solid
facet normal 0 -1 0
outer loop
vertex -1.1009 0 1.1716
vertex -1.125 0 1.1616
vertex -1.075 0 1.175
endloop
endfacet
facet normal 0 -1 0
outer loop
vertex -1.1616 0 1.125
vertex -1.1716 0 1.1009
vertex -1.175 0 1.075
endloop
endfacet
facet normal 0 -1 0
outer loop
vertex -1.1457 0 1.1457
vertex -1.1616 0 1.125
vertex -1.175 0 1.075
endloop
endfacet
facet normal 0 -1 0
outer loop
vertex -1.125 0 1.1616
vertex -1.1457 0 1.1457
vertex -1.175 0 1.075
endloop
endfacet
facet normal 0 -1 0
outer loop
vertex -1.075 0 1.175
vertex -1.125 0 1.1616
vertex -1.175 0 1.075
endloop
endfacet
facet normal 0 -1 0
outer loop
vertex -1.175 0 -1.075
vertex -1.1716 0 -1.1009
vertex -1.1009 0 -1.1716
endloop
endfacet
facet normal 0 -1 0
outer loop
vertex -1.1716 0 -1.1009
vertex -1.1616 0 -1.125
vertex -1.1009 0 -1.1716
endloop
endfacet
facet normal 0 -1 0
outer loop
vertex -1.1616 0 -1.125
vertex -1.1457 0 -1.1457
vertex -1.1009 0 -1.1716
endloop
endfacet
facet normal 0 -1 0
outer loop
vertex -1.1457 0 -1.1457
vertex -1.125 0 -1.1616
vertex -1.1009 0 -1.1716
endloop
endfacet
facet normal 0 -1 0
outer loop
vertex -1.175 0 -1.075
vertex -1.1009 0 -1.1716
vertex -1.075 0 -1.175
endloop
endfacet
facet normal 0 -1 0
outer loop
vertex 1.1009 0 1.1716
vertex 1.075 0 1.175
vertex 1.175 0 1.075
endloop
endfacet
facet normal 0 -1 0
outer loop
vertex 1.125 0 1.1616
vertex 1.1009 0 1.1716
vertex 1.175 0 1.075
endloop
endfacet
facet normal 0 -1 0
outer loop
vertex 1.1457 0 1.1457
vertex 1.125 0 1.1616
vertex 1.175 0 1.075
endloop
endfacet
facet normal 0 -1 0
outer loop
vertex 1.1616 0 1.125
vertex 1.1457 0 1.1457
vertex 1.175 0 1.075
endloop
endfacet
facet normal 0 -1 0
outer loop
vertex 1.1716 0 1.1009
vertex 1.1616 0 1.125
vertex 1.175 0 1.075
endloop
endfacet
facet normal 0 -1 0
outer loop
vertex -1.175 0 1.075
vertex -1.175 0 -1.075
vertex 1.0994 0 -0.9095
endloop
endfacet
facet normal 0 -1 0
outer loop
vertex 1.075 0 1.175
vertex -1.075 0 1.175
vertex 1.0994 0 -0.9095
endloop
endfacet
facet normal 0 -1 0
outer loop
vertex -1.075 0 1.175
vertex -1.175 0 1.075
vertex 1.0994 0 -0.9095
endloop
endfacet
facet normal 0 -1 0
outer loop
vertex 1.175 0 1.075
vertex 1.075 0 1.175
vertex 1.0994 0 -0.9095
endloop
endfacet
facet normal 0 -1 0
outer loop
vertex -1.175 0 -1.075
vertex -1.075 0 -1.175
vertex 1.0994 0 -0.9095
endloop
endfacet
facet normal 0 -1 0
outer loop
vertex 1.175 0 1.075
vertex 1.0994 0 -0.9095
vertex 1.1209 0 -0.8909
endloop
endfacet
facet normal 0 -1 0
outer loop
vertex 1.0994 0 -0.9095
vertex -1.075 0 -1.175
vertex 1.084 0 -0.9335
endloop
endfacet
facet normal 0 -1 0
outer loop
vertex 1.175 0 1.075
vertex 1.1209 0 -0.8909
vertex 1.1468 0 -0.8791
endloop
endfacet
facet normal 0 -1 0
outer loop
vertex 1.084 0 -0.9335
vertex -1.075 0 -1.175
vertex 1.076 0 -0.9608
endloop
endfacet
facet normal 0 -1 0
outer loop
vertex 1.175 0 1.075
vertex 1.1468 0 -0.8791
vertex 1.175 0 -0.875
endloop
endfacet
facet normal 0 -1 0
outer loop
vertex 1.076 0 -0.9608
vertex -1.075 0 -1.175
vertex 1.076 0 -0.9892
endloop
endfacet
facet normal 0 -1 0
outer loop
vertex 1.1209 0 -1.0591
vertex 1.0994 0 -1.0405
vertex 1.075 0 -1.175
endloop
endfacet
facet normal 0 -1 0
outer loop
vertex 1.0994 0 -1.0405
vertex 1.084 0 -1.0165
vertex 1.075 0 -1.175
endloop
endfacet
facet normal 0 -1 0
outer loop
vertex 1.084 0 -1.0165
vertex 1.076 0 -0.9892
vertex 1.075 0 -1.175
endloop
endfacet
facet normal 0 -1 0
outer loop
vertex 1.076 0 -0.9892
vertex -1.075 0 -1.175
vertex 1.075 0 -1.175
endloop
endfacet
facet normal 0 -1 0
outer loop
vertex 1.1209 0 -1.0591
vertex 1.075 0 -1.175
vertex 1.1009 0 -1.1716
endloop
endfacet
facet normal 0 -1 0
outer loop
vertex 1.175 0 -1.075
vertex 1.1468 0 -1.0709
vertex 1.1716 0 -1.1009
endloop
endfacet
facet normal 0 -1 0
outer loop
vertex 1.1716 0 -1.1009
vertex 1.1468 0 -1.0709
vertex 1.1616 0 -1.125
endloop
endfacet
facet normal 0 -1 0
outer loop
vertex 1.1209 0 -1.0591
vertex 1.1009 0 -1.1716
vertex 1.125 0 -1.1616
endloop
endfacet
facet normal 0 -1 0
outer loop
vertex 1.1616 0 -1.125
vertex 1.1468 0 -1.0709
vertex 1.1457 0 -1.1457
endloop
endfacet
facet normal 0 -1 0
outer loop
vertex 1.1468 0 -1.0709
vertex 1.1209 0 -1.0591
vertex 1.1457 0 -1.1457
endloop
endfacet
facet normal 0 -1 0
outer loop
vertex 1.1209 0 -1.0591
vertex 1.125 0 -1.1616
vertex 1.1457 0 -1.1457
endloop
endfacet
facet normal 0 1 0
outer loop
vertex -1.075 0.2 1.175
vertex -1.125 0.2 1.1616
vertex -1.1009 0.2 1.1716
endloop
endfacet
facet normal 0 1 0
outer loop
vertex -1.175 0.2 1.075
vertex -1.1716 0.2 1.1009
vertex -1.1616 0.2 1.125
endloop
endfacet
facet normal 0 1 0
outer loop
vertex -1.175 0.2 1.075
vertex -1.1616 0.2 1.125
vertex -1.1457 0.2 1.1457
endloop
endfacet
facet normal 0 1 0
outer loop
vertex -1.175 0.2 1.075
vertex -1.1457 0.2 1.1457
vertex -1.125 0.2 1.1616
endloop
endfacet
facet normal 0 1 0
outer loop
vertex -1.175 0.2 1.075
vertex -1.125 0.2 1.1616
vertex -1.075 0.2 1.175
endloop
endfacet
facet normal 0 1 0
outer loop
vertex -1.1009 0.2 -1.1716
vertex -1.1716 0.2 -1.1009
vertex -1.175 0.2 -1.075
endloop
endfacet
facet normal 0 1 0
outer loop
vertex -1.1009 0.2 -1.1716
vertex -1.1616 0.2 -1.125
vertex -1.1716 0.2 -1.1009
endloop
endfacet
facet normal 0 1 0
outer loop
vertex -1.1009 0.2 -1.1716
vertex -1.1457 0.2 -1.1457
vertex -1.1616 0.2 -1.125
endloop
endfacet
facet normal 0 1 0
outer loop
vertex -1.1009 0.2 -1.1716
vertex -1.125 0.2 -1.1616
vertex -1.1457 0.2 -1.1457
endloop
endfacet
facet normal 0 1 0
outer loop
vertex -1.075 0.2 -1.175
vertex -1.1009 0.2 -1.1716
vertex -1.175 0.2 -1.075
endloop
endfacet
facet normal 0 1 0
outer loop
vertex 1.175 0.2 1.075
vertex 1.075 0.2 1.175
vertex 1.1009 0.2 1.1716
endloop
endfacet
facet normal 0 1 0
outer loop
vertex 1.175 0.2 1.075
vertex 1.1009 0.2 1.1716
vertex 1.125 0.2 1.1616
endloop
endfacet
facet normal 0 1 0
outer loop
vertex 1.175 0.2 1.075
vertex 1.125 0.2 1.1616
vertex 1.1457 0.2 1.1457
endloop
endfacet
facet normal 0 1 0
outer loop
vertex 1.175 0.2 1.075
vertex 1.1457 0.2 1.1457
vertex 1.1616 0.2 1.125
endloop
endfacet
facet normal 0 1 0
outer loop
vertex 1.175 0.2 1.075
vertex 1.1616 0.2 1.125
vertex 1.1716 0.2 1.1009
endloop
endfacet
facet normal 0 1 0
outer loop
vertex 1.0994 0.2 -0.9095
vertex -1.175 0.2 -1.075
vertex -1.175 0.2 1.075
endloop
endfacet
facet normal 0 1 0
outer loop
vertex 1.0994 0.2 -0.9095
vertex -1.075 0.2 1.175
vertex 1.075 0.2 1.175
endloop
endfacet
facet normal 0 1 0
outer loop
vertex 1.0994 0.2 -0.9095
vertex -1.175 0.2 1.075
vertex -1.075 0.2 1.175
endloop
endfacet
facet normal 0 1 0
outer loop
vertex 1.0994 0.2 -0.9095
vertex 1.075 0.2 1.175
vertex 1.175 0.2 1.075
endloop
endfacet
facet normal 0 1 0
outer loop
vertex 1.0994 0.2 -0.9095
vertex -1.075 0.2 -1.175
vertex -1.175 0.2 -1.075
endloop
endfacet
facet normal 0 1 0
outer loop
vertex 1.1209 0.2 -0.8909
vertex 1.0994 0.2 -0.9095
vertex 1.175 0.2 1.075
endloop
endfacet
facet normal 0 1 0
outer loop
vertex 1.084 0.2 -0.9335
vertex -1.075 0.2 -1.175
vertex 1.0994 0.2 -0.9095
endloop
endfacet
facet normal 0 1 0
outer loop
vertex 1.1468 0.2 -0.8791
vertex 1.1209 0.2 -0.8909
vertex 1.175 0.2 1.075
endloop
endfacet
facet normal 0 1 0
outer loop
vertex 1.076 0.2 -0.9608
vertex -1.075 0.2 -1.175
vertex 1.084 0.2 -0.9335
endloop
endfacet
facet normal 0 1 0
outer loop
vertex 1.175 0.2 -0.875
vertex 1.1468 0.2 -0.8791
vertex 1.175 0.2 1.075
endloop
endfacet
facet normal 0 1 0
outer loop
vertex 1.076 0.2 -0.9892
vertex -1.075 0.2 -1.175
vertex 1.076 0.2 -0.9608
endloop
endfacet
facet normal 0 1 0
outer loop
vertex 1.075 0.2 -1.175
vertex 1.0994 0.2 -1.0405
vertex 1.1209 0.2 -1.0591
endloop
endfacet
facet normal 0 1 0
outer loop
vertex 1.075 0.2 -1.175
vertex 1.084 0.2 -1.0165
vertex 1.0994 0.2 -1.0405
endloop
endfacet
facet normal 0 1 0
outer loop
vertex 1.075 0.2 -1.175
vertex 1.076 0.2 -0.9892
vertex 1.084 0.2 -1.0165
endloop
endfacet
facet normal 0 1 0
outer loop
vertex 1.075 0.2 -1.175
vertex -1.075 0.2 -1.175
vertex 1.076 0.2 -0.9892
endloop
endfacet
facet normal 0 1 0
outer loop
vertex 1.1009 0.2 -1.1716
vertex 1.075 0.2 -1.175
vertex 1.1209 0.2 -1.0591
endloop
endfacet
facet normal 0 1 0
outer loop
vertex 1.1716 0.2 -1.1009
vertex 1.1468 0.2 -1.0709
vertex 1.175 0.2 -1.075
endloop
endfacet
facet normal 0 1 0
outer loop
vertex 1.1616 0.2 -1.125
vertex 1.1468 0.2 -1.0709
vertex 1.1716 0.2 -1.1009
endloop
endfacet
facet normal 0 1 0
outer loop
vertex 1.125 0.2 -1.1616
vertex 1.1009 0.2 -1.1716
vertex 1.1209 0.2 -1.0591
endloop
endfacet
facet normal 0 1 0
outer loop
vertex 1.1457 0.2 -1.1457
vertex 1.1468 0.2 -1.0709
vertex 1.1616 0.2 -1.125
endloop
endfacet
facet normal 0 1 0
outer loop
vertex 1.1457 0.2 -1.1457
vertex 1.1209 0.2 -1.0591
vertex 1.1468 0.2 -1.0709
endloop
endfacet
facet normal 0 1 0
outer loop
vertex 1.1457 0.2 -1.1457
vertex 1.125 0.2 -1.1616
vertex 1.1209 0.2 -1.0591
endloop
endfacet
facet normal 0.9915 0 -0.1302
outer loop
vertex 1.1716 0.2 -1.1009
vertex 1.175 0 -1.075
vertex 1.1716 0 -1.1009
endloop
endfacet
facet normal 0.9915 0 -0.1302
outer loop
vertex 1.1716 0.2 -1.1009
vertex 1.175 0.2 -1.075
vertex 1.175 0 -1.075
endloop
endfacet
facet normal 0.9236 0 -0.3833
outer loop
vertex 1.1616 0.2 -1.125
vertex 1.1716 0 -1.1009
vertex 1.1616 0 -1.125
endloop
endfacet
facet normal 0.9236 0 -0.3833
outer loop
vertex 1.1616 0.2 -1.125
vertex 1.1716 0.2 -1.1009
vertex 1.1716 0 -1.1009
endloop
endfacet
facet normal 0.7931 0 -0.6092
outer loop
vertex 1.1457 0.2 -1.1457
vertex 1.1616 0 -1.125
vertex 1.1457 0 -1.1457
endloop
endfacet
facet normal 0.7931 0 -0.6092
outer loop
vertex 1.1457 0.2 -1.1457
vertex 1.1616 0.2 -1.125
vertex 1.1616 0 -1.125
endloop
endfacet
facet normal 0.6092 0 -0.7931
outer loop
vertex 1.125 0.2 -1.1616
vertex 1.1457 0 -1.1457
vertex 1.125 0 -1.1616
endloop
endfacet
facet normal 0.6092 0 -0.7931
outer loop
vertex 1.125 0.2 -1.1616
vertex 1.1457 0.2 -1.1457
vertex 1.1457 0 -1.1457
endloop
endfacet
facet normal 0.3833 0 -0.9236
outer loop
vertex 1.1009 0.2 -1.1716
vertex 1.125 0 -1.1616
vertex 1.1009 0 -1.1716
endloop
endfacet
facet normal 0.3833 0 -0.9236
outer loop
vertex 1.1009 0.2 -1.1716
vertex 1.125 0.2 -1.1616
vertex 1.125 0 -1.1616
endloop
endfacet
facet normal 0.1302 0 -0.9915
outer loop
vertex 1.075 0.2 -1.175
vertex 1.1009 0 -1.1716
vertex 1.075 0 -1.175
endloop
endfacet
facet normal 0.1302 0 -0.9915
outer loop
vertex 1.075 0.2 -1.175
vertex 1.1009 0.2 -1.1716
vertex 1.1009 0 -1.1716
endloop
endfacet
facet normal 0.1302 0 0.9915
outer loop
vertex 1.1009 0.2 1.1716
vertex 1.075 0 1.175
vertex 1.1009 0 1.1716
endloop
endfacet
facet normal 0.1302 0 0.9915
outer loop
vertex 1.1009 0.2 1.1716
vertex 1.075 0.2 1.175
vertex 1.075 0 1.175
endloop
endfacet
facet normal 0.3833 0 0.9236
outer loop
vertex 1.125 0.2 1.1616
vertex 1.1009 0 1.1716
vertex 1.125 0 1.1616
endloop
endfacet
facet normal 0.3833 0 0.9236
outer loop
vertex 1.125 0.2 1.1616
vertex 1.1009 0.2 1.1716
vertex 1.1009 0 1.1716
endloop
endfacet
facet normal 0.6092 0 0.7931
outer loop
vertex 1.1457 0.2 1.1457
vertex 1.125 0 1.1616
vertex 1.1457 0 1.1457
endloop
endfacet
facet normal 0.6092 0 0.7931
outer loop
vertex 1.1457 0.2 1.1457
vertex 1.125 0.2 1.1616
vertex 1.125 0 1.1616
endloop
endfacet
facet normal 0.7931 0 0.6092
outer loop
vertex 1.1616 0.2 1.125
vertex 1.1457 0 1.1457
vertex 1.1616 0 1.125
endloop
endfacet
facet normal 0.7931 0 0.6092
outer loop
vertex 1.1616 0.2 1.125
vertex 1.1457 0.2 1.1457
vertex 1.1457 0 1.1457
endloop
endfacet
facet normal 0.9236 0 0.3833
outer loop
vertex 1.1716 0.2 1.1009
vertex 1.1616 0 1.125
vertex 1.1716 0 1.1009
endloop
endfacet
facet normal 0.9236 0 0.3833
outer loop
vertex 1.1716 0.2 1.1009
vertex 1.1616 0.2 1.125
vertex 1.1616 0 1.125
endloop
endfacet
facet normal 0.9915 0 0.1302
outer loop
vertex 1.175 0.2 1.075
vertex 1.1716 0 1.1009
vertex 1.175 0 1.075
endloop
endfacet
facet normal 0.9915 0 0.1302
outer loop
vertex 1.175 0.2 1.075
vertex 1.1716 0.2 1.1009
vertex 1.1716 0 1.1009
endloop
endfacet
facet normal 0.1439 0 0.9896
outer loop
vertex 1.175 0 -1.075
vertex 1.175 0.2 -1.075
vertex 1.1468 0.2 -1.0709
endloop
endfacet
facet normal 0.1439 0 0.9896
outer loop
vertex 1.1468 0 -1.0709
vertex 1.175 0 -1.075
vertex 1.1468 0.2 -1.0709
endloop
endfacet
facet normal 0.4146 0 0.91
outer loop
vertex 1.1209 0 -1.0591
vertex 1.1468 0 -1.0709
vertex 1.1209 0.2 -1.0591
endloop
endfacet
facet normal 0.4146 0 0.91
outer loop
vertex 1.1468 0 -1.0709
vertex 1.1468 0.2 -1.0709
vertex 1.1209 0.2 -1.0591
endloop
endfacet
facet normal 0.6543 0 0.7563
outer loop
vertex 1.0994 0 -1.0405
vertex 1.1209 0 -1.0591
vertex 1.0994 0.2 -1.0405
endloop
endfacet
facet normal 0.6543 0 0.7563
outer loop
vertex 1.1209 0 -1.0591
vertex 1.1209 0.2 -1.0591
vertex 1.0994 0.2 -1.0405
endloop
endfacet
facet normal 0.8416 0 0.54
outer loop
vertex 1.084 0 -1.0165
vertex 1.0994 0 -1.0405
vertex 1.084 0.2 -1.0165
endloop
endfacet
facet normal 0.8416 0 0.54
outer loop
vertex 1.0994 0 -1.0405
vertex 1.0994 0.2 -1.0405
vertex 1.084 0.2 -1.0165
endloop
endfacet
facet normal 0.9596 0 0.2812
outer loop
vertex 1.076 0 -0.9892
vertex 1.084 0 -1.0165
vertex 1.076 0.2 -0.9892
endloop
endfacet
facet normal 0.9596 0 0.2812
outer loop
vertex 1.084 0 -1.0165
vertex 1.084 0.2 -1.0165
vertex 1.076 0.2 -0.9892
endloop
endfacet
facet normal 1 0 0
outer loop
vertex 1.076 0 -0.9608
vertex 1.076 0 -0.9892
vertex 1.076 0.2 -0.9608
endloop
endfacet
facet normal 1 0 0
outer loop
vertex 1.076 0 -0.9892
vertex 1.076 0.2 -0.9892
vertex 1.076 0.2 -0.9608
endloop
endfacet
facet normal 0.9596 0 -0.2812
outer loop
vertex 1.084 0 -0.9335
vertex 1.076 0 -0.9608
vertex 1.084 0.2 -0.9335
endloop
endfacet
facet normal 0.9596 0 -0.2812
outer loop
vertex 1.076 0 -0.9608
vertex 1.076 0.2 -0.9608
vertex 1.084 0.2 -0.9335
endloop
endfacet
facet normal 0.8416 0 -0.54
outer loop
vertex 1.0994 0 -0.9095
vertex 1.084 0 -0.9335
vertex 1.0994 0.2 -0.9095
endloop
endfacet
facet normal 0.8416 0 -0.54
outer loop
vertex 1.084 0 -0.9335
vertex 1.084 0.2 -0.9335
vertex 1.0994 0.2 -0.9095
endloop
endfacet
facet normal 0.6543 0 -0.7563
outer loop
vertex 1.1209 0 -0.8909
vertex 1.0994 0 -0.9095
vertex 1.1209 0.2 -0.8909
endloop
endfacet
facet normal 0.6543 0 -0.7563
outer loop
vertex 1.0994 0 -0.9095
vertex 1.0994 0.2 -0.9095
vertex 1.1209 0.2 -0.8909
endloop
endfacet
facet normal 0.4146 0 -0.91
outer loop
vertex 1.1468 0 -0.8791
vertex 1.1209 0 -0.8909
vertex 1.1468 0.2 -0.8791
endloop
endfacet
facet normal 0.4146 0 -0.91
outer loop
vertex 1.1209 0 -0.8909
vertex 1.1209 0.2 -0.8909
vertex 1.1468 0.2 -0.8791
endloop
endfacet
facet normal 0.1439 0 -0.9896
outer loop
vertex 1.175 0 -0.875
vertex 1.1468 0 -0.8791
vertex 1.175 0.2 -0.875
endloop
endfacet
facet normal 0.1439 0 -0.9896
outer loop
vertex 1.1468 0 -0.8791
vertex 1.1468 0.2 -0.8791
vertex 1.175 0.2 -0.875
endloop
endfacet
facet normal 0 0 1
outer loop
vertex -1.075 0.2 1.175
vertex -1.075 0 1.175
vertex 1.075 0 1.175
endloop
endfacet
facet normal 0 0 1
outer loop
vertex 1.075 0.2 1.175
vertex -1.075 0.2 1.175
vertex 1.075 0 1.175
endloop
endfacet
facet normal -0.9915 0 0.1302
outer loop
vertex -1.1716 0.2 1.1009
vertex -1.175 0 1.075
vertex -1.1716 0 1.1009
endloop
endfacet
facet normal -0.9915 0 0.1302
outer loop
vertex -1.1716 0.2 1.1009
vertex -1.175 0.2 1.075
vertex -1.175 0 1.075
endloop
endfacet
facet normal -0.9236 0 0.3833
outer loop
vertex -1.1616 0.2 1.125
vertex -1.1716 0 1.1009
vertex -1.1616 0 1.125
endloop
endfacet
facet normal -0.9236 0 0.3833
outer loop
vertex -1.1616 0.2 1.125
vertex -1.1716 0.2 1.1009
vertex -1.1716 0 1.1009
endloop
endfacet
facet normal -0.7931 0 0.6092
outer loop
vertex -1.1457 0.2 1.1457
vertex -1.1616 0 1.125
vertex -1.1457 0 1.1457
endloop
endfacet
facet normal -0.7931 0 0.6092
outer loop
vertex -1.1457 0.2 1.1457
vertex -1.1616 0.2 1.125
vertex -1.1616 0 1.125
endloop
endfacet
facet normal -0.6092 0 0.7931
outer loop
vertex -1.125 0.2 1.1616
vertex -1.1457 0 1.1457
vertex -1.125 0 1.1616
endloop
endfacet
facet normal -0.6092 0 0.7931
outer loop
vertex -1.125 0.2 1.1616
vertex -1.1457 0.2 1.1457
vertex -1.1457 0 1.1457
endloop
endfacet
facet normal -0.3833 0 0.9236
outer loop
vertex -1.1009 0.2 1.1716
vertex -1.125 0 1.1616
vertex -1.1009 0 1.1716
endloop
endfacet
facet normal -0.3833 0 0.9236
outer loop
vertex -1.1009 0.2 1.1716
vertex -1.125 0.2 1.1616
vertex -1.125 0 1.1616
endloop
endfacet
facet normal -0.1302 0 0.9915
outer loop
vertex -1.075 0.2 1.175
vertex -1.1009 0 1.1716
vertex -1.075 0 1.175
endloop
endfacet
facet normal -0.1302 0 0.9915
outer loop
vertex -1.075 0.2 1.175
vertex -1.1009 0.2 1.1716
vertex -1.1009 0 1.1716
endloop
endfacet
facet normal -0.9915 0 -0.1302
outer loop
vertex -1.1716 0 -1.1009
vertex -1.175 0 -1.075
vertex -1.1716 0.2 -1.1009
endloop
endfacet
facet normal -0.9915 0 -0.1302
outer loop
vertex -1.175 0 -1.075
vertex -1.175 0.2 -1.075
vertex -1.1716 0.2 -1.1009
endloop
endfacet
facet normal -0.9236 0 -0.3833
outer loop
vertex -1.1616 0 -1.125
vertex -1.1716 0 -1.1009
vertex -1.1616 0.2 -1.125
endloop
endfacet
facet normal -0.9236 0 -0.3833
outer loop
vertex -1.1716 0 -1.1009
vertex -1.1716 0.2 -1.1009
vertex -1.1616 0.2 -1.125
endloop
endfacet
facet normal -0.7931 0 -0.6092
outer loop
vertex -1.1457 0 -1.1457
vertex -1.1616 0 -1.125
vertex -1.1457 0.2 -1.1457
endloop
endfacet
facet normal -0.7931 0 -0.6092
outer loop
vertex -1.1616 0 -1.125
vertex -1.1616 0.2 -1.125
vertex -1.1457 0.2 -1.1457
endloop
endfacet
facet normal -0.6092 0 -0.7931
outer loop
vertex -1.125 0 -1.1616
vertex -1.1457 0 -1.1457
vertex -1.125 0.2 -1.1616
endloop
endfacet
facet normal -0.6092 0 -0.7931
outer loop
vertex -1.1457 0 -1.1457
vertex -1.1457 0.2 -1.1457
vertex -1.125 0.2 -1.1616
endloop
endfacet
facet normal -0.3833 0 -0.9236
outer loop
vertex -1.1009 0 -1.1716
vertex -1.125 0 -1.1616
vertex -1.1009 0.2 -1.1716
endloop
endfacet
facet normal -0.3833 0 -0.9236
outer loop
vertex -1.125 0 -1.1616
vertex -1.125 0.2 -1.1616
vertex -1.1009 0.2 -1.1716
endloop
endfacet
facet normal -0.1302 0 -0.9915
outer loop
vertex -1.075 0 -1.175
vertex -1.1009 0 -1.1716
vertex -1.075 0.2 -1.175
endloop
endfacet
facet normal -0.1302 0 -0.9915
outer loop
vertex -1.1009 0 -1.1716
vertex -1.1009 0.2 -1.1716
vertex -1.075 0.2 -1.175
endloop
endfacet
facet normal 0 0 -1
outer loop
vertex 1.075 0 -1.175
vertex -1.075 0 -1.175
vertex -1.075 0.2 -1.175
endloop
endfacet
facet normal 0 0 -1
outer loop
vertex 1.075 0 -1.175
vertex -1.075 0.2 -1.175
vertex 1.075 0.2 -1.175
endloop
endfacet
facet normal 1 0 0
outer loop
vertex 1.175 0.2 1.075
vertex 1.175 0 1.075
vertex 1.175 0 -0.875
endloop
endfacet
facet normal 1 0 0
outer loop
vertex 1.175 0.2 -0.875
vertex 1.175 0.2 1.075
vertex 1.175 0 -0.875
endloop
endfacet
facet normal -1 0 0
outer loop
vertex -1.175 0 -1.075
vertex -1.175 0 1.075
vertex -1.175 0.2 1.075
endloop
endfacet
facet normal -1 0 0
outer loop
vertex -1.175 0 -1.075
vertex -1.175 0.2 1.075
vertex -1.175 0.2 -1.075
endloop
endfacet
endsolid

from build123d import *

# Parameters (mm, degrees)
SKETCH1_W           = 2.35
SKETCH1_H           = 2.35
BOSS_EXTRUDE1_DEPTH = 0.2
FILLET1_R           = 0.1
SKETCH2_R           = 0.1
CUT_EXTRUDE1_DEPTH  = 1.2


with BuildPart() as part:
    # Sketch1 → Boss-Extrude1 (new body)
    with BuildSketch(Plane(origin=(0, 0, 0), x_dir=(1, 0, 0), z_dir=(0, 1, 0))):
        Rectangle(SKETCH1_W, SKETCH1_H)
    extrude(amount=BOSS_EXTRUDE1_DEPTH)

    # Fillet1
    fillet1_edges = [part.edges().sort_by_distance(p)[0] for p in [
        (1.175, 0.1, 1.175),
        (-1.175, 0.1, 1.175),
        (-1.175, 0.1, -1.175),
        (1.175, 0.1, -1.175),
    ]]
    fillet(fillet1_edges, radius=FILLET1_R)

    # Sketch2 → Cut-Extrude1 (cut, through all)
    with BuildSketch(Plane(origin=(0, 0.2, 0), x_dir=(1, 0, 0), z_dir=(0, 1, 0))):
        with Locations((1.175, 0.975)):
            Circle(SKETCH2_R)
    extrude(amount=-CUT_EXTRUDE1_DEPTH, mode=Mode.SUBTRACT)


solid = part.part
